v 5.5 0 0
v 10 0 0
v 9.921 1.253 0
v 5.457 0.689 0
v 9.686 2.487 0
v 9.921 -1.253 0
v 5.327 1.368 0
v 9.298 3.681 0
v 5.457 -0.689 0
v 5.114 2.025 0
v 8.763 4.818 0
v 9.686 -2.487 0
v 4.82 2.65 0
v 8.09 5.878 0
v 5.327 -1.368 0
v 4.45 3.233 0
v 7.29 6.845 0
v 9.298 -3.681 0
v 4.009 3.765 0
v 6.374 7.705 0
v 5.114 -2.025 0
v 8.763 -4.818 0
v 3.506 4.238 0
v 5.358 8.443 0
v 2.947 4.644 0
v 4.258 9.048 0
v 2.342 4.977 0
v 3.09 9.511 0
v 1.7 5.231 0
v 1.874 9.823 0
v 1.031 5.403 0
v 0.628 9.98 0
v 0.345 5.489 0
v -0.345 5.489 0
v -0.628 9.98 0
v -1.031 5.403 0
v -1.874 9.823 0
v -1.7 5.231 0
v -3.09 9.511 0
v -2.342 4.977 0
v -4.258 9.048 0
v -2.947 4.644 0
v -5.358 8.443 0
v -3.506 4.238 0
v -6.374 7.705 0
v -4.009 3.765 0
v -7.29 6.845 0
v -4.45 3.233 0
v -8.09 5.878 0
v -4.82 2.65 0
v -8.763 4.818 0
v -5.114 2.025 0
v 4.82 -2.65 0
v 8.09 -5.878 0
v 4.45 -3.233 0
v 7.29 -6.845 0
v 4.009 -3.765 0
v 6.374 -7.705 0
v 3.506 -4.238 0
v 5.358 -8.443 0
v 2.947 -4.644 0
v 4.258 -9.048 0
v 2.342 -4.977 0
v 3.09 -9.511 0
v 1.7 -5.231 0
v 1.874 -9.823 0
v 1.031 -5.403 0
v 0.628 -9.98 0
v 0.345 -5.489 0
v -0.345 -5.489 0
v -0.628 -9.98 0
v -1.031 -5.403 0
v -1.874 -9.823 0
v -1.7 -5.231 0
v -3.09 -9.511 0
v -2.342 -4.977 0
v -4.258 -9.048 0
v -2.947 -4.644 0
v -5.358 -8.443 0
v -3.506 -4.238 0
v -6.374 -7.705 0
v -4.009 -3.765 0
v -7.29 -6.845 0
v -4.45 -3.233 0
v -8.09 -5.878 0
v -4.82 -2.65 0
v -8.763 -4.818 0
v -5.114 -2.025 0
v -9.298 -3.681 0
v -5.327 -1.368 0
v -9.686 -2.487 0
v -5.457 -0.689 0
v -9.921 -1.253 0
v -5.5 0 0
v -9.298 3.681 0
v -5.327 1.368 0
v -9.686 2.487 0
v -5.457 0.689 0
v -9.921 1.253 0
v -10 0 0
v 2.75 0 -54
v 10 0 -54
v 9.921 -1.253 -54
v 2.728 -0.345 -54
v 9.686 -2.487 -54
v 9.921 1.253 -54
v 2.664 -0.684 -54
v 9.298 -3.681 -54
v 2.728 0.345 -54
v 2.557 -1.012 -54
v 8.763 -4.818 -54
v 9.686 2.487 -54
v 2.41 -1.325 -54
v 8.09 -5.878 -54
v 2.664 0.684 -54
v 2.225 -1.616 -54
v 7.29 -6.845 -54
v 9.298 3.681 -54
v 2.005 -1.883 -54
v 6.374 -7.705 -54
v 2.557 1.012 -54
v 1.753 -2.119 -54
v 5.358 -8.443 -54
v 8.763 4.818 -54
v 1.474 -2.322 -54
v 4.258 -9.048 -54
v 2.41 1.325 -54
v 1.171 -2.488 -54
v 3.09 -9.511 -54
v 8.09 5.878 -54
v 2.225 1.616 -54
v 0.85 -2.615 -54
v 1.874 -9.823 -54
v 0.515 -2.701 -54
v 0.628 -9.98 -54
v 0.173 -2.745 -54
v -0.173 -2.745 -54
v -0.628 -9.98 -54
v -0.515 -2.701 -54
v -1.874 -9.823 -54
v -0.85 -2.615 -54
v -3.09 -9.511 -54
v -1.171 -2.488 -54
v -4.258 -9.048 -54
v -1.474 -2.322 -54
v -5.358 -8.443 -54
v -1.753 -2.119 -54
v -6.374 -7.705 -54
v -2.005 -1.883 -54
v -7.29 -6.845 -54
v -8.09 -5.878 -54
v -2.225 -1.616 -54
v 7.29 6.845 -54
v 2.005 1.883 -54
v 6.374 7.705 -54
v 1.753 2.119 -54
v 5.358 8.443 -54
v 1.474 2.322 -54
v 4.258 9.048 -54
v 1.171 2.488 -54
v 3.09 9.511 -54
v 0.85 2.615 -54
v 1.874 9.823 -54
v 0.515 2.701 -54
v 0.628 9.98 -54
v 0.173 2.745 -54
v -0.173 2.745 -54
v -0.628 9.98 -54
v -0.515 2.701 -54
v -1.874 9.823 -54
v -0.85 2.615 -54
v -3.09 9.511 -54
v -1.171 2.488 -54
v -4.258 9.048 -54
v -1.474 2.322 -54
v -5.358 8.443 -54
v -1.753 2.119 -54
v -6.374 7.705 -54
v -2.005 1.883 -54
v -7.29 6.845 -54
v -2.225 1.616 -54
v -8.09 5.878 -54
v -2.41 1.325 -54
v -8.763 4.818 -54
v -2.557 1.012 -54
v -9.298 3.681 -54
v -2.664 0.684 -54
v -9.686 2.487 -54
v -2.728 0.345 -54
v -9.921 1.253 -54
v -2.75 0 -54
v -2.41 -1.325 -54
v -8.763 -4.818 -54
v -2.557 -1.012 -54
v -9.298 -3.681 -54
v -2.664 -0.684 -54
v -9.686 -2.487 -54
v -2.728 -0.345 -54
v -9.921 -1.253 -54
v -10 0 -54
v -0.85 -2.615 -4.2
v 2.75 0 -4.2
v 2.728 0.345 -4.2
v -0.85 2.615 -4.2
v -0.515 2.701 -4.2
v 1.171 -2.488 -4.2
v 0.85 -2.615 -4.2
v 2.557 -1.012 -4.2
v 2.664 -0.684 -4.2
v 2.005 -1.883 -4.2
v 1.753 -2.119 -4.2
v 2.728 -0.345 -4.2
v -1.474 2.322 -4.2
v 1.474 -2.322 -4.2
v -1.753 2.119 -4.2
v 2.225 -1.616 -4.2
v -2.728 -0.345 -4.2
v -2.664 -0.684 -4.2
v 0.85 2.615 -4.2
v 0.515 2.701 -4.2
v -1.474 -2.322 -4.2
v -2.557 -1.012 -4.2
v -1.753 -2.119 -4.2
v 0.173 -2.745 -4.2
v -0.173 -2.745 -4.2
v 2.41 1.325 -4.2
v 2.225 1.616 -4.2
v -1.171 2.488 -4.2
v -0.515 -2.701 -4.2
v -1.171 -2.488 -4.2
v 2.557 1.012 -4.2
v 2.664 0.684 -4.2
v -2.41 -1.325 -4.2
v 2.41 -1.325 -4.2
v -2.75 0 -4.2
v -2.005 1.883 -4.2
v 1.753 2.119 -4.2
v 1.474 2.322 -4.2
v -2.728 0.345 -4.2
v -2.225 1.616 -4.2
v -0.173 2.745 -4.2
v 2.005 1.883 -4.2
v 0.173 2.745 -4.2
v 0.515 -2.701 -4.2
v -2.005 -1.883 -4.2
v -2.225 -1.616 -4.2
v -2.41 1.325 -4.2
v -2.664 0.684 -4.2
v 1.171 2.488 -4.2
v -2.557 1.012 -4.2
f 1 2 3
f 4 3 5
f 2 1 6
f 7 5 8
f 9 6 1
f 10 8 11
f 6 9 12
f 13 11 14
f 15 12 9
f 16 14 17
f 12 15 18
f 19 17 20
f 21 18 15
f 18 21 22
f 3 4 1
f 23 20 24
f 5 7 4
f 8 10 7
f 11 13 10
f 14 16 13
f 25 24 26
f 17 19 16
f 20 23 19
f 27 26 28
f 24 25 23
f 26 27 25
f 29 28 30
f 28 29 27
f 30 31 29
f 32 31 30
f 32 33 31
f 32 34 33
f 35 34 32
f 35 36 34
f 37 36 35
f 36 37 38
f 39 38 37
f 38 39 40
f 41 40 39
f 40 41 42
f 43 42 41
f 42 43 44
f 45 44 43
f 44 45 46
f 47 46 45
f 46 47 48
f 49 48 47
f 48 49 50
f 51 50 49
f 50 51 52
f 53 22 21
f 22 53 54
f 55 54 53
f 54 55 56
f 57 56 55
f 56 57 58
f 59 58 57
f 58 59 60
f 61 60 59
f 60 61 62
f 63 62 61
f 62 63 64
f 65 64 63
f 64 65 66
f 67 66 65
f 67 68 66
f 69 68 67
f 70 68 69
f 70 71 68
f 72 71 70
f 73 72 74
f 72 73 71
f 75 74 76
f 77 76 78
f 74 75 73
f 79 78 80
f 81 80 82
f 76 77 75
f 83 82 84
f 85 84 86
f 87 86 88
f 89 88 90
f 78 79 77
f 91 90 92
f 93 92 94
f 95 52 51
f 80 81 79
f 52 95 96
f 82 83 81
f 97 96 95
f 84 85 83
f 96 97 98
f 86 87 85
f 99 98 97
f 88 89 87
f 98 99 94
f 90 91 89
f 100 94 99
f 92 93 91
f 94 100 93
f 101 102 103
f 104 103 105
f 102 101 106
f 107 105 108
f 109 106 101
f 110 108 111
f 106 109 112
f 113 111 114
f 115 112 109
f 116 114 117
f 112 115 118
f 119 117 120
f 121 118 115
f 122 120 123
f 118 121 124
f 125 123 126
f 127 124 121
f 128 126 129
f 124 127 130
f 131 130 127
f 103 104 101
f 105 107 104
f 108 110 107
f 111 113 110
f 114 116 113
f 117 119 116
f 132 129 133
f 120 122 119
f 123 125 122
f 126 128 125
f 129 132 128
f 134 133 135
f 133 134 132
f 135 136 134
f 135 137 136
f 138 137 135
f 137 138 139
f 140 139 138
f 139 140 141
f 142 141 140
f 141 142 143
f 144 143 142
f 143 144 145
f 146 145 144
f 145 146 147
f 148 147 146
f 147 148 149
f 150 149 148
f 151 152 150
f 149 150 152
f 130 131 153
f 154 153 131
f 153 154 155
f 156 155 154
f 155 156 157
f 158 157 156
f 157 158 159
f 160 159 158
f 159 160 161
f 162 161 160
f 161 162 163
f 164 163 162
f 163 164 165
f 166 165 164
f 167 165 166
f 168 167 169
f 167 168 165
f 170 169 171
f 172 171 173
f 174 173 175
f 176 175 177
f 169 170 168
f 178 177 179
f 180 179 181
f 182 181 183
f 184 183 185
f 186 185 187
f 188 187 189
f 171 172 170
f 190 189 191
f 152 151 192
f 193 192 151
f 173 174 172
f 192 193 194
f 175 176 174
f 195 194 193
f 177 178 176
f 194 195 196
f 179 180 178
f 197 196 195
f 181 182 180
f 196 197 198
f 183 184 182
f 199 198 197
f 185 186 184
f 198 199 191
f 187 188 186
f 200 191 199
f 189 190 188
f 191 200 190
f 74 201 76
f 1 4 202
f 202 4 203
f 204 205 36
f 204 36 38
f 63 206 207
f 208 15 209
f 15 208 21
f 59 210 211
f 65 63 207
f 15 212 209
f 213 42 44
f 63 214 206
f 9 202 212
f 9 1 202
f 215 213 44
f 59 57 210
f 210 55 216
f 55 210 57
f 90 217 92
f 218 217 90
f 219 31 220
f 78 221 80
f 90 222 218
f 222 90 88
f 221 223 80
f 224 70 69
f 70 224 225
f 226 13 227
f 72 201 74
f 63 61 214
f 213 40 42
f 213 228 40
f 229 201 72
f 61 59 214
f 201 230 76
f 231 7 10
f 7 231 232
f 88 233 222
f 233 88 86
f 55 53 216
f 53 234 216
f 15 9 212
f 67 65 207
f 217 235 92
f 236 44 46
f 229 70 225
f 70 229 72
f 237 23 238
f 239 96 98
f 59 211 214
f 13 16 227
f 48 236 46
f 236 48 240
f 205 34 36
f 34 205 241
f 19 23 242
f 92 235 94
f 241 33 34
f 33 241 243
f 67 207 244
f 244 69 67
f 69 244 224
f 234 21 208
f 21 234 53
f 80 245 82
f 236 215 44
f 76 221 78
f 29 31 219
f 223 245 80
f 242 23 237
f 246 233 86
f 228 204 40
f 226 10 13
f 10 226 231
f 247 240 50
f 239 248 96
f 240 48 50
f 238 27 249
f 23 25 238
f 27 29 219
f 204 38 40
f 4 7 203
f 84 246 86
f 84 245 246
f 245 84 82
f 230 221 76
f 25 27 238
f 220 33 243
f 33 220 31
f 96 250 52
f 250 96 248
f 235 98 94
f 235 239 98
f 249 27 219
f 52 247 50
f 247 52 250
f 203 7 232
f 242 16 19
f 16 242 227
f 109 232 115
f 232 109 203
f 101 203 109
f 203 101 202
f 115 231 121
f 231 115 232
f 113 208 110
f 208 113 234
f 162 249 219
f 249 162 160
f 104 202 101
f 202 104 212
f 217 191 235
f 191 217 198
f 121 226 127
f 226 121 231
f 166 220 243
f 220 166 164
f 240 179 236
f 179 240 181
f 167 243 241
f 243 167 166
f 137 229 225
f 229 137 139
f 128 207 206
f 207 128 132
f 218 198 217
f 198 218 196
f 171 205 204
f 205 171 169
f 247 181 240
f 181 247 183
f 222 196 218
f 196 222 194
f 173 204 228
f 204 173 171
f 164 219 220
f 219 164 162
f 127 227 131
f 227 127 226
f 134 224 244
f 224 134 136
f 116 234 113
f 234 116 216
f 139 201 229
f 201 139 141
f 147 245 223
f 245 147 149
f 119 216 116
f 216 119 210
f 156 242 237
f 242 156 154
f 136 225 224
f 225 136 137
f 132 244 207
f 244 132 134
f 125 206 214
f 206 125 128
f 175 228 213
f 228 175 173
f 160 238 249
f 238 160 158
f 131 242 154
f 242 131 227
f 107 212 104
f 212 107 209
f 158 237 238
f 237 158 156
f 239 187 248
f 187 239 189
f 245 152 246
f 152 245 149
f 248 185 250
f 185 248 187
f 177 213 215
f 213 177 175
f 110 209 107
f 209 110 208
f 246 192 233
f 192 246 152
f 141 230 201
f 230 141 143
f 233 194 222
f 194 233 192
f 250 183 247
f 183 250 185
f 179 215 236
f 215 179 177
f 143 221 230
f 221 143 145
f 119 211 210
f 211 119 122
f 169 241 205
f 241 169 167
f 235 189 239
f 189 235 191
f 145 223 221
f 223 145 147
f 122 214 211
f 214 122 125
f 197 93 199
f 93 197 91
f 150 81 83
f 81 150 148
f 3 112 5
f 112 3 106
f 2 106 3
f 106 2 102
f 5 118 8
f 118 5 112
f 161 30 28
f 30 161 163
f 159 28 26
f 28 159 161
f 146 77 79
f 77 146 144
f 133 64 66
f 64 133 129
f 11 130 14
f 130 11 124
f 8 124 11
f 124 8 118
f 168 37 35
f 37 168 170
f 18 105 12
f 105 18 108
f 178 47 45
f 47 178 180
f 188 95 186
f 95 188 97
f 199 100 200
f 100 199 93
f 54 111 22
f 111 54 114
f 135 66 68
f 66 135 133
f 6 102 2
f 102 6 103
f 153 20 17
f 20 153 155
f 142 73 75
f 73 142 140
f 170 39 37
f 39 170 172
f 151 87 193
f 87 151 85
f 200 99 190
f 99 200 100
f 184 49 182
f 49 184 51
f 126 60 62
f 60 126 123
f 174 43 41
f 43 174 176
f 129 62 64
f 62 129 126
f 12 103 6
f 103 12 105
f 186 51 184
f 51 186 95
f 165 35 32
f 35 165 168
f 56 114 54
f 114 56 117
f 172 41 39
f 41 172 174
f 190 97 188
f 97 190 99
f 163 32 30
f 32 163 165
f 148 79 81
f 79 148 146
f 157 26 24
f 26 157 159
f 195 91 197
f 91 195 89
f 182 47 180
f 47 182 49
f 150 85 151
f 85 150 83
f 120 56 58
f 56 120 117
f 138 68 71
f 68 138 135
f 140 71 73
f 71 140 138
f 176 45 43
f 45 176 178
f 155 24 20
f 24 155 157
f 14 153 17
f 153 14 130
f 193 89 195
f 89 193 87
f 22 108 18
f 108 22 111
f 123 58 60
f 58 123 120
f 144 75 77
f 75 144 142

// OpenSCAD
$fn = 50;


difference() {
	union() {
		translate(v = [0, 0, -54.0000000000]) {
			cylinder(h = 54, r = 10.0000000000);
		}
		cylinder(h = 0, r = 19.0000000000);
	}
	union() {
		translate(v = [0, 0, 0]) {
			rotate(a = [0, 0, 0]) {
				difference() {
					union() {
						#translate(v = [0, 0, -54.0000000000]) {
							cylinder(h = 54, r = 2.2500000000);
						}
						#translate(v = [0, 0, -4.2000000000]) {
							cylinder(h = 4.2000000000, r1 = 2.7500000000, r2 = 5.5000000000);
						}
						#translate(v = [0, 0, -54.0000000000]) {
							cylinder(h = 54, r = 2.7500000000);
						}
						#translate(v = [0, 0, -54.0000000000]) {
							cylinder(h = 54, r = 2.2500000000);
						}
					}
					union();
				}
			}
		}
	}
}
